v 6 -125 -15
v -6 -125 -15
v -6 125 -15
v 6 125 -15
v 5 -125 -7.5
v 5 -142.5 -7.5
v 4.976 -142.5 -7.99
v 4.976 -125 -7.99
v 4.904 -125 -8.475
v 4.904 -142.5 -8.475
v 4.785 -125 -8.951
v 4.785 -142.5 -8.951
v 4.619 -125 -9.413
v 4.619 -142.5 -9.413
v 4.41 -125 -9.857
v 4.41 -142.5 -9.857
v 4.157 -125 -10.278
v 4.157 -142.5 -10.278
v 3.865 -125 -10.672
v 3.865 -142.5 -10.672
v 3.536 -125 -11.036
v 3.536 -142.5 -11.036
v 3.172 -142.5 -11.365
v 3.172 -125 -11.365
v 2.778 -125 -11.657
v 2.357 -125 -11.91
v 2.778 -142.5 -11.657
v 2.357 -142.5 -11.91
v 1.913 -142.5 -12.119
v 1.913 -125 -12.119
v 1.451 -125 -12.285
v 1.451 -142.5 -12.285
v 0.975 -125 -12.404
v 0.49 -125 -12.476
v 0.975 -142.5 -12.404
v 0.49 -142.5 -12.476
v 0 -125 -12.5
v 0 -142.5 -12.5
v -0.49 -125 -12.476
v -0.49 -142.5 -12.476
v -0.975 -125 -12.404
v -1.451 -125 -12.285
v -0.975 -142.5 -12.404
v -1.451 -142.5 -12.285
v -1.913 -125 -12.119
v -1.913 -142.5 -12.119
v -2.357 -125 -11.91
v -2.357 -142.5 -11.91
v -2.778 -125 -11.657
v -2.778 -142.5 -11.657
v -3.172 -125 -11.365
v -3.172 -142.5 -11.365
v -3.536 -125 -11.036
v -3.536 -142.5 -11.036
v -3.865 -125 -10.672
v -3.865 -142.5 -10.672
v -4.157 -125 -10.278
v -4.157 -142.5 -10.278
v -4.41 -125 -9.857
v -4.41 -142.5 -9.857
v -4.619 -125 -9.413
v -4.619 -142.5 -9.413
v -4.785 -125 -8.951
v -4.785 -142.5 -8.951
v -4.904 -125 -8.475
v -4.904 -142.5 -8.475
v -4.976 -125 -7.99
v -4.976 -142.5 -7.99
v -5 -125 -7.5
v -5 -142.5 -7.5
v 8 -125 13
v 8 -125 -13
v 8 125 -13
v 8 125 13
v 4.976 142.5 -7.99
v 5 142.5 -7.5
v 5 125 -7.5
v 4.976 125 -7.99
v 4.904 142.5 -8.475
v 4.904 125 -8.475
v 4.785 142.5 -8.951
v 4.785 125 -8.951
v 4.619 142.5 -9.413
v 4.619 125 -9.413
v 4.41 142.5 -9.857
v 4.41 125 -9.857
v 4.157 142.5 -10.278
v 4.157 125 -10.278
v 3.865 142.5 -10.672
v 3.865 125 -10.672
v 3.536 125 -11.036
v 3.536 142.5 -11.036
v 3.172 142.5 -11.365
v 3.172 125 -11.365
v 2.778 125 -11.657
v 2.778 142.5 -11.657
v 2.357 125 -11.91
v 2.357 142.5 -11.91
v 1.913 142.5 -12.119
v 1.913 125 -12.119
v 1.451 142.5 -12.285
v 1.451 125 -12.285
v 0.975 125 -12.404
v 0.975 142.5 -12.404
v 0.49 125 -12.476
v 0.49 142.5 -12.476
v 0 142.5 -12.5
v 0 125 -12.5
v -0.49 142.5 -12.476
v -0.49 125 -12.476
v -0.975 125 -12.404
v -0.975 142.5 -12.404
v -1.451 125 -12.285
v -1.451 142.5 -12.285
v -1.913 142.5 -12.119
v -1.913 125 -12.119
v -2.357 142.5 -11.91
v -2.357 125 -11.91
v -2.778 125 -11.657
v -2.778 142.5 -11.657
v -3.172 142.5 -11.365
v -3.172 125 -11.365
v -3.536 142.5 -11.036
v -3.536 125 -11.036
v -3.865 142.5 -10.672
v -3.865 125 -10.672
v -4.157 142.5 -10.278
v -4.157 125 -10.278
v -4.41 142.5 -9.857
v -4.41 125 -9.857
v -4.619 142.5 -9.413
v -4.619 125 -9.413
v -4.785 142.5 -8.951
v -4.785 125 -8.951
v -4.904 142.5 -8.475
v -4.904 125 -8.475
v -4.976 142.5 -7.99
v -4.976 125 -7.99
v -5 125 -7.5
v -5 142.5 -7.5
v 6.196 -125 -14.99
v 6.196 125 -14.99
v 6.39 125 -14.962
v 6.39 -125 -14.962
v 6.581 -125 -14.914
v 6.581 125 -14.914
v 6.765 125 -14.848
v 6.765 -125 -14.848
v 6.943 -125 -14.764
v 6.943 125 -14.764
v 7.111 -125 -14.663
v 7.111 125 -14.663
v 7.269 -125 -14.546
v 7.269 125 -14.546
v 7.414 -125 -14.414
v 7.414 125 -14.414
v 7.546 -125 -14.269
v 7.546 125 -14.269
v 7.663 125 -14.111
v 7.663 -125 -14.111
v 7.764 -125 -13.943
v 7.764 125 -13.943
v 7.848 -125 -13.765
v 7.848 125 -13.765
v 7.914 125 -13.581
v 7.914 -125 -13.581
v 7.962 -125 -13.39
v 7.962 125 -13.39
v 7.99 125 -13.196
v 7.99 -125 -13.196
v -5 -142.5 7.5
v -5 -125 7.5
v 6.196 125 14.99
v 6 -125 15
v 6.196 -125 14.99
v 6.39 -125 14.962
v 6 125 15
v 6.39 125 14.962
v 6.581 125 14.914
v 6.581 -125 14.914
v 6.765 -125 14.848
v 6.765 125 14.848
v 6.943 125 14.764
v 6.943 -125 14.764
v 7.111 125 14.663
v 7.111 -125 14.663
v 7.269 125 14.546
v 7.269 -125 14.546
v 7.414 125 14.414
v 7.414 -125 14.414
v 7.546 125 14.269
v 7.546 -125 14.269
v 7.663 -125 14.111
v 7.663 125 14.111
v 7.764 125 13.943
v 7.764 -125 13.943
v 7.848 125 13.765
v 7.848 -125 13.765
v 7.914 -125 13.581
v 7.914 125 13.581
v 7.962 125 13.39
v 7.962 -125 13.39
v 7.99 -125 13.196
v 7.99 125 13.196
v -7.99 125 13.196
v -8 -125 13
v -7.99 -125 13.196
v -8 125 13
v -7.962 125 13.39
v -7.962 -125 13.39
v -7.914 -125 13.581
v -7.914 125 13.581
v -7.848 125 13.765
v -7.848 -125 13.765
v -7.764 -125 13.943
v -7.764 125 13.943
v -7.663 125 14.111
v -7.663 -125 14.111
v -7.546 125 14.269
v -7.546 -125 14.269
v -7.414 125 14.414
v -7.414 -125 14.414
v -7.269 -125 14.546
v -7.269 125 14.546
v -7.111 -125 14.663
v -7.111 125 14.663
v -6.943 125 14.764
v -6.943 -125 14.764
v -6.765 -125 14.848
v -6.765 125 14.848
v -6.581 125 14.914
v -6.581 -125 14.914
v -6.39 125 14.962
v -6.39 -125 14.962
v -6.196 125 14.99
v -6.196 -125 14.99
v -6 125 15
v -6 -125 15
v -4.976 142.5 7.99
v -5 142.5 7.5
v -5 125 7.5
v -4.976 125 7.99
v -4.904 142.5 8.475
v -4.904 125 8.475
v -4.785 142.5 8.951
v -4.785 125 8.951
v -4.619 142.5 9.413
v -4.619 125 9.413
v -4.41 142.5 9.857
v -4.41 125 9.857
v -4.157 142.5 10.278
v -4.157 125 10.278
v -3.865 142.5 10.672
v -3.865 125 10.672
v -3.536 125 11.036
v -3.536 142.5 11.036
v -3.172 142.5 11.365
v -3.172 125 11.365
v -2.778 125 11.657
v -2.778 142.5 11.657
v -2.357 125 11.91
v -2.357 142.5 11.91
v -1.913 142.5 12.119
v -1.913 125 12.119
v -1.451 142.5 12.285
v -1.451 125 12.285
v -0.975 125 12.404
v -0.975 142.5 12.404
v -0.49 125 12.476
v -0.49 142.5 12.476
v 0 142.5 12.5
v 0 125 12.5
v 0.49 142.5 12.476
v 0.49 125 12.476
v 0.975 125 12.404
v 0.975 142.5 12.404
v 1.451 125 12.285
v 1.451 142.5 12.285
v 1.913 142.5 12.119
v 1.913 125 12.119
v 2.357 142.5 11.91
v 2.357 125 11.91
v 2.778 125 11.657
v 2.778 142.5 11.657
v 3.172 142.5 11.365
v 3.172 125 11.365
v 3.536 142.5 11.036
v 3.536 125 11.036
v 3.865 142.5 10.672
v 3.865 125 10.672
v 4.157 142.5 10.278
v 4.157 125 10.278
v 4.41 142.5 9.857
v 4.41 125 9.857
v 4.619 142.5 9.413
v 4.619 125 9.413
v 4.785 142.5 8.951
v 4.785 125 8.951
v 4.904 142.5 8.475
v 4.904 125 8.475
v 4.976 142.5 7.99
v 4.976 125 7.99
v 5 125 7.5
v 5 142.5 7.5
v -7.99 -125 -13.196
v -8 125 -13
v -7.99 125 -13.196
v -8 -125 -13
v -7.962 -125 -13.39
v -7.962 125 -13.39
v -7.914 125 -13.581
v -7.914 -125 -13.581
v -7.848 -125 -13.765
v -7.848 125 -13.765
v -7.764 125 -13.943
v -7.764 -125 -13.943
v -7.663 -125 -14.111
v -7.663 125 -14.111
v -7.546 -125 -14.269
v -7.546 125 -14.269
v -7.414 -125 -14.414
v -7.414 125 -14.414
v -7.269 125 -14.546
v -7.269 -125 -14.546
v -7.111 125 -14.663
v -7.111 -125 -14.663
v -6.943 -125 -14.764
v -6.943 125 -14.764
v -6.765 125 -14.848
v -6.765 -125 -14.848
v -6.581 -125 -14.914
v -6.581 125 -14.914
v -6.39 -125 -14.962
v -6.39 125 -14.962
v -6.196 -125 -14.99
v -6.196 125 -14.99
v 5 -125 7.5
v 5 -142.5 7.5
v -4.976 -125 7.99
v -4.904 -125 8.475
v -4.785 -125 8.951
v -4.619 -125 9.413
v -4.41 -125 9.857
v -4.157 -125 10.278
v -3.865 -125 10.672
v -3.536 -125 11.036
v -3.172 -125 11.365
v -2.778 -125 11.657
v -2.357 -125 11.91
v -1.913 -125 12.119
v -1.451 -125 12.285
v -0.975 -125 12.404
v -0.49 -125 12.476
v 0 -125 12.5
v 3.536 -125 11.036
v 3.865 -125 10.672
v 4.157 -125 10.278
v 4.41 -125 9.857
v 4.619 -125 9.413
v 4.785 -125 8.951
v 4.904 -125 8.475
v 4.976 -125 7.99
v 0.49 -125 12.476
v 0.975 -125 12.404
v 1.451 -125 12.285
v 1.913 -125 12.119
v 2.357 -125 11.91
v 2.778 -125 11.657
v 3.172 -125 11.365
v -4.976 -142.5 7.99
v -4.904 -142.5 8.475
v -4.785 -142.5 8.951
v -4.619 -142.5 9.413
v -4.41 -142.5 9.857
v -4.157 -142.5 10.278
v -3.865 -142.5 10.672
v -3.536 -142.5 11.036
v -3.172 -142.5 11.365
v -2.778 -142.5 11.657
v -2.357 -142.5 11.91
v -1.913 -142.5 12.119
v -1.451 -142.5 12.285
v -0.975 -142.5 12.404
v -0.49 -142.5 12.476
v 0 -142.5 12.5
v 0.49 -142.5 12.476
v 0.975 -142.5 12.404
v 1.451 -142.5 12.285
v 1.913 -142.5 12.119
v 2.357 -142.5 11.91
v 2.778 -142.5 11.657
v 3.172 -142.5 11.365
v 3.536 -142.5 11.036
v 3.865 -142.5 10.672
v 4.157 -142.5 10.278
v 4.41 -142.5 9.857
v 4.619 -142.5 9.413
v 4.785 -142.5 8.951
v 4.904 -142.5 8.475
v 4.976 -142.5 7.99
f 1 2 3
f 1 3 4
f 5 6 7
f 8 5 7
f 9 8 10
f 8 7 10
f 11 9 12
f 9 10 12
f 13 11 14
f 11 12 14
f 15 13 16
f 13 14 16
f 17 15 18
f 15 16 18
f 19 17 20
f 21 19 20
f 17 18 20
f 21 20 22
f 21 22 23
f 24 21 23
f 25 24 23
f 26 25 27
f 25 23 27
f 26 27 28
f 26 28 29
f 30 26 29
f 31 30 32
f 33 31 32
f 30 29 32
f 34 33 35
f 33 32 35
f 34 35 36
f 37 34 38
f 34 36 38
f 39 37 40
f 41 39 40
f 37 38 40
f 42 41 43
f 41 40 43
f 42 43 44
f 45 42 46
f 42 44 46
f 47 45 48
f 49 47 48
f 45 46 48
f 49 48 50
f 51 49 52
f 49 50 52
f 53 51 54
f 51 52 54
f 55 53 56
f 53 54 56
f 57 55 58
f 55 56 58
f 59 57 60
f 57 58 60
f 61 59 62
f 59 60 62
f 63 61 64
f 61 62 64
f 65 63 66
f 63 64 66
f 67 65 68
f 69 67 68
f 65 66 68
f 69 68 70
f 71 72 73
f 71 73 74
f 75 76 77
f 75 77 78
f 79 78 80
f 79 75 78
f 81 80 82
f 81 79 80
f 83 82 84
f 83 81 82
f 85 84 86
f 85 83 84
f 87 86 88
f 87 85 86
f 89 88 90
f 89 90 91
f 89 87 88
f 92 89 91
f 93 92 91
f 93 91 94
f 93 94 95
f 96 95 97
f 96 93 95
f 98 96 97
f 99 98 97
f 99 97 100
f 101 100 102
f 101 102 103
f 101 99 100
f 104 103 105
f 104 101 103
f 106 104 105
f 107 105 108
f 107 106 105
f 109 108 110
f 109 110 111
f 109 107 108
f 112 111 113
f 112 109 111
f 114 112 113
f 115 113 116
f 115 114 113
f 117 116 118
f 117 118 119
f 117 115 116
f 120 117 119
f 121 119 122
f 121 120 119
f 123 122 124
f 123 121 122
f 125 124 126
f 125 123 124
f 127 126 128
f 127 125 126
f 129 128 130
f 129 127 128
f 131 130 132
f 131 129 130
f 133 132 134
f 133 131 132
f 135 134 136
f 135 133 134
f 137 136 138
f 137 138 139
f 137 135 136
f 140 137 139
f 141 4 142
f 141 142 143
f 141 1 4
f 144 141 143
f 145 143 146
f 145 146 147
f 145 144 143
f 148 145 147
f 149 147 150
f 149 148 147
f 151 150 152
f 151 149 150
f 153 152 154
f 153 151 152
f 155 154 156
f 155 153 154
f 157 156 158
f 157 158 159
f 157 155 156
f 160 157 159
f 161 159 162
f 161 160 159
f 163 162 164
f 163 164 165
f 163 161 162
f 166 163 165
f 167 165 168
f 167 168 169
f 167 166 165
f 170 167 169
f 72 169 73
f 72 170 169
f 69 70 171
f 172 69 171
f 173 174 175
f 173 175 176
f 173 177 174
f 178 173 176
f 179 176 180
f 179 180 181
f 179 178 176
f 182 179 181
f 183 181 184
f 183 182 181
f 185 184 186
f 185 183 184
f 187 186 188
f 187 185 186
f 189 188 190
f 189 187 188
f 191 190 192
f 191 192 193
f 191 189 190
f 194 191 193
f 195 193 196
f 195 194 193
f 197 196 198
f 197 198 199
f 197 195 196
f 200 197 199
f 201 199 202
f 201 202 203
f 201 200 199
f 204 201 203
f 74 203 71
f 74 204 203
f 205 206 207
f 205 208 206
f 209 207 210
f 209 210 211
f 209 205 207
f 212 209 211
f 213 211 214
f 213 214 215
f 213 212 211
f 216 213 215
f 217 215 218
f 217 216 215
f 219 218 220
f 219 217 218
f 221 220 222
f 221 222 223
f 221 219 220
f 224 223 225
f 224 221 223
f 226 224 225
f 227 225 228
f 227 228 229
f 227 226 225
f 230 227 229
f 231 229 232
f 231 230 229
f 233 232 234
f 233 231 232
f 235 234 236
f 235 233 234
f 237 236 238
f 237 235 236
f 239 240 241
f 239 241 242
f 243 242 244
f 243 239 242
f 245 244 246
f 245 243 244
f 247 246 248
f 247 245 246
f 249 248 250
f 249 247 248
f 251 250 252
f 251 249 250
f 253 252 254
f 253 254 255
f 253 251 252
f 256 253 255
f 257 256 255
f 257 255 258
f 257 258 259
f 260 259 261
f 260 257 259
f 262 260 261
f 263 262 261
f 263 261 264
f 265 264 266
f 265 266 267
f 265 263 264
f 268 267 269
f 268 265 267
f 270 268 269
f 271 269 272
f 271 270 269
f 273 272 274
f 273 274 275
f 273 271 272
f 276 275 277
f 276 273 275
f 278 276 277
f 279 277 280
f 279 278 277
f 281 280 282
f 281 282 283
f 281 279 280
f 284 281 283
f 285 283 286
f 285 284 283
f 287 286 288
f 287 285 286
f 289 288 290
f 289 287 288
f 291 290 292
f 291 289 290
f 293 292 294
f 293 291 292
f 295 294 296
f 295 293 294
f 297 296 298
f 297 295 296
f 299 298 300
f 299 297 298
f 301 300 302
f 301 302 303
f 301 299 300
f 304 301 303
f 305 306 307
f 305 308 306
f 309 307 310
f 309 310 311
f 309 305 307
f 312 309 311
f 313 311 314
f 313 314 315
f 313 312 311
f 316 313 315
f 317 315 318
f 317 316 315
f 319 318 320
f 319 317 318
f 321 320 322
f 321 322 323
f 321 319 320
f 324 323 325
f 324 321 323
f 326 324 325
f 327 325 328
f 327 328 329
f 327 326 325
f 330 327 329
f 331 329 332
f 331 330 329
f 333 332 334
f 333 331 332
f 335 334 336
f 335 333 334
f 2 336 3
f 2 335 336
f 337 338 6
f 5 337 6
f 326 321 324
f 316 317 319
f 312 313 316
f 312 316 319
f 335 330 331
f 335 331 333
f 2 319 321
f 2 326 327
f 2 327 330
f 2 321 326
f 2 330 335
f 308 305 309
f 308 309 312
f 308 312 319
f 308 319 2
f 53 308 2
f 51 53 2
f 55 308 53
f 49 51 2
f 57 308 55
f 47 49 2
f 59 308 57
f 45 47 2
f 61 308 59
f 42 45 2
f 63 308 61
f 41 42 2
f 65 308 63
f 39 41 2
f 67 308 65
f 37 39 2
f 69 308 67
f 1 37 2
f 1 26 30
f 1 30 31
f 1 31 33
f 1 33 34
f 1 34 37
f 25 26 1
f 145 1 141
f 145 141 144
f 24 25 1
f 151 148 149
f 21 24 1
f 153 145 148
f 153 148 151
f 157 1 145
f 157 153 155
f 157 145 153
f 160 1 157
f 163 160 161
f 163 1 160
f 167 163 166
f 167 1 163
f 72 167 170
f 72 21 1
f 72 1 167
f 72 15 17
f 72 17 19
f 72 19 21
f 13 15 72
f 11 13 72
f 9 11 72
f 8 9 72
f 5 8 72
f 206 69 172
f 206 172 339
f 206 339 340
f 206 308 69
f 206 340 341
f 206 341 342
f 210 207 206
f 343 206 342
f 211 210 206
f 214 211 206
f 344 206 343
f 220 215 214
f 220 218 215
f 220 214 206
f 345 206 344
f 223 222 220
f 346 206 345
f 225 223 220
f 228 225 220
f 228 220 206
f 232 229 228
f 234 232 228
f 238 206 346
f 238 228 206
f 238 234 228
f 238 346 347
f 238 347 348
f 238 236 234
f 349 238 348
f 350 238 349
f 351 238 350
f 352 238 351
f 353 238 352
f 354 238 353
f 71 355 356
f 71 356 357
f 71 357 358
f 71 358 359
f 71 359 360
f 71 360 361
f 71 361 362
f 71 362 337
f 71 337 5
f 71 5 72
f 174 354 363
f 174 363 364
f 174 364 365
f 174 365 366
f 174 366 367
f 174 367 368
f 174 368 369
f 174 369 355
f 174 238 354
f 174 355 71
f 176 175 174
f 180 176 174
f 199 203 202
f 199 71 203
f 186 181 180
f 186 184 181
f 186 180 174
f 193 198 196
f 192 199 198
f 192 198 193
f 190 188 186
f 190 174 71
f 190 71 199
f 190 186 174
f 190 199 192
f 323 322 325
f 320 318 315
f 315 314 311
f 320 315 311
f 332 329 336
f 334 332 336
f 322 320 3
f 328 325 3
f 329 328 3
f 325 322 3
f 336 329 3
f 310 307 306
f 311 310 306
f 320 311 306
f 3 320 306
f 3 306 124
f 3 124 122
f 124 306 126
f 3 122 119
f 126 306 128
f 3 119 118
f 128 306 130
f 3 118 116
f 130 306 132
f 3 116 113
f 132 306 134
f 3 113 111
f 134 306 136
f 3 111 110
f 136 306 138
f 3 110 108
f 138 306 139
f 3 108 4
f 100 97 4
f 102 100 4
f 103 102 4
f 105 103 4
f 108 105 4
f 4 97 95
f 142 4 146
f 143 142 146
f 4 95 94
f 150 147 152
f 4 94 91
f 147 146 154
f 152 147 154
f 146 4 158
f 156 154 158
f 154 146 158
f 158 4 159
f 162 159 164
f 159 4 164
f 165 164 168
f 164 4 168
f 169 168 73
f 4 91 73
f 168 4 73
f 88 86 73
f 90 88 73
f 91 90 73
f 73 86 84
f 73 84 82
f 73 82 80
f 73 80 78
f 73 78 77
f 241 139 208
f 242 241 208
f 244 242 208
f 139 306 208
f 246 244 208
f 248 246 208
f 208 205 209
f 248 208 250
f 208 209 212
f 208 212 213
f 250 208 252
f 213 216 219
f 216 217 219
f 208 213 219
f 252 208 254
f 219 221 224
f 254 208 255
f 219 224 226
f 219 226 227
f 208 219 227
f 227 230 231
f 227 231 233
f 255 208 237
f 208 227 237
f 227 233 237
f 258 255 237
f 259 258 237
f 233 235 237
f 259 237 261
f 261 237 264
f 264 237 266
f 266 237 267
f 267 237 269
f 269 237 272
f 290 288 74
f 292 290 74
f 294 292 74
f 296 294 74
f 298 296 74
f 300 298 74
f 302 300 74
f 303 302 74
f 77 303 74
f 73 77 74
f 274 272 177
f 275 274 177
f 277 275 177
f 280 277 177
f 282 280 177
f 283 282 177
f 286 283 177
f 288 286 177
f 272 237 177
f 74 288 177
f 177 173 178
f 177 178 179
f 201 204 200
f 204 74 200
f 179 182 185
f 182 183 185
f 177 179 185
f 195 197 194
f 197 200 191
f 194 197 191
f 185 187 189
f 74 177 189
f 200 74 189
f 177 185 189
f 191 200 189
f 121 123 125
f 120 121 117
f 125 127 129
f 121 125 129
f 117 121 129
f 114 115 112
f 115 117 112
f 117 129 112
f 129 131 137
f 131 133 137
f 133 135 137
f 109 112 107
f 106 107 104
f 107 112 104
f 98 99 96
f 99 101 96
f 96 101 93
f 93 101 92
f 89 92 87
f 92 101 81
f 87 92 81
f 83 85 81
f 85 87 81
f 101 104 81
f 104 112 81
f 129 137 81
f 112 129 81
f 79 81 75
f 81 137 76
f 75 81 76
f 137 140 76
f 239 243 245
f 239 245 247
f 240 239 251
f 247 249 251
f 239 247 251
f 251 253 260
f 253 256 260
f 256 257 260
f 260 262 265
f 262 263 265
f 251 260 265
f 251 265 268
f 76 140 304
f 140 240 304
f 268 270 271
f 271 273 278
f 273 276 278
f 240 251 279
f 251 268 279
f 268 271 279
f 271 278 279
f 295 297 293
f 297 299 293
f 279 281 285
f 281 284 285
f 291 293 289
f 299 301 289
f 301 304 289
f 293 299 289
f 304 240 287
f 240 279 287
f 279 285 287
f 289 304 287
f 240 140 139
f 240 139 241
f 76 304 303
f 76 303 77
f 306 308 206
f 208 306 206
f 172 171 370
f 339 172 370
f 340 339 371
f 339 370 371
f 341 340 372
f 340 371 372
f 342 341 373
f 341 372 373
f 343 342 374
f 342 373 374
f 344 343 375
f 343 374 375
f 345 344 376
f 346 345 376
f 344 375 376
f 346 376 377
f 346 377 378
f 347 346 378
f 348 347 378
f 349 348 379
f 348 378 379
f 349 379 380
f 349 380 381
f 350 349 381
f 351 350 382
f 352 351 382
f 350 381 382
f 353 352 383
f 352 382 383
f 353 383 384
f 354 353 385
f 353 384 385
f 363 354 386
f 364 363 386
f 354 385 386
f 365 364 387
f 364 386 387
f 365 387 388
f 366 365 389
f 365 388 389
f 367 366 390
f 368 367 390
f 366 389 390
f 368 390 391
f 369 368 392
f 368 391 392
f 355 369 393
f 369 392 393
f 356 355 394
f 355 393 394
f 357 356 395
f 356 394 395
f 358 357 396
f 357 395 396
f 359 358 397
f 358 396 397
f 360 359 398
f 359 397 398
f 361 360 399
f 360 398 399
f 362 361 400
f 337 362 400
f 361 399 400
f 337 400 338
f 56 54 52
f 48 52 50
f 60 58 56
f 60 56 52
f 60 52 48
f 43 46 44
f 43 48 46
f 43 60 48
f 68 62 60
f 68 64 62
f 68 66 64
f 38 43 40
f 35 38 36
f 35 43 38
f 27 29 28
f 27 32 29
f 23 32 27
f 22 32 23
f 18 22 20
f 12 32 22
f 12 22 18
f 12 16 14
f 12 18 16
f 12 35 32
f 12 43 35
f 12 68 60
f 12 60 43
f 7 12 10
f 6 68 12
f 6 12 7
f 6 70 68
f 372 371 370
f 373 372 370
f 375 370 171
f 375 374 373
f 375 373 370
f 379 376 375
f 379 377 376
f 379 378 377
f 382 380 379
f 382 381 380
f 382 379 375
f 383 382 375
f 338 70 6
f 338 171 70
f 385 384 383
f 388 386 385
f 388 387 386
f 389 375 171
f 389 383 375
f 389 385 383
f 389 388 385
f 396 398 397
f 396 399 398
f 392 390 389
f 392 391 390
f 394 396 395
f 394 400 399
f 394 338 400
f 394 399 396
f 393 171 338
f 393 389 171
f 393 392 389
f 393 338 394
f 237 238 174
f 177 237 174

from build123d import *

# Parameters (mm, degrees)
F0_W          = 16
F0_H          = 30
F1_DEPTH      = 142.5
F1_DEPTH_BACK = 142.5
F2_W          = 16
F2_H          = 30
F3_DEPTH      = 17.5
F4_R          = 2


# Not quite as in the source:
# - a pattern or mirror of a feature is missing from the dataset's text; its kind, count and spacing are read off the source's solid


with BuildPart() as f1:
    # F0 (on Front) → F1 (new body, two sides)
    with BuildSketch(Plane.XZ) as f1_sk:
        Rectangle(F0_W, F0_H)
    extrude(amount=F1_DEPTH)
    extrude(f1_sk.sketch, amount=-F1_DEPTH_BACK)

    # F2 (on face) → F3 (cut)
    with BuildSketch(Plane.XZ.offset(142.5)):
        Rectangle(F2_W, F2_H)
        with BuildLine():
            ThreePointArc((5, -7.5), (0, -12.5), (-5, -7.5))
            Line((-5, -7.5), (-5, 7.5))
            ThreePointArc((-5, 7.5), (0, 12.5), (5, 7.5))
            Line((5, 7.5), (5, -7.5))
        make_face(mode=Mode.SUBTRACT)
    f3 = extrude(amount=-F3_DEPTH, mode=Mode.SUBTRACT)

    # F3_copies: F3 across plane
    add(f3.mirror(Plane.ZX), mode=Mode.SUBTRACT)

    # F4
    f4_edges = [f1.edges().sort_by_distance(p)[0] for p in [
        (-8, 0, 15),
        (8, 0, 15),
        (8, 0, -15),
        (-8, 0, -15),
    ]]
    fillet(f4_edges, radius=F4_R)


solid = f1.part
